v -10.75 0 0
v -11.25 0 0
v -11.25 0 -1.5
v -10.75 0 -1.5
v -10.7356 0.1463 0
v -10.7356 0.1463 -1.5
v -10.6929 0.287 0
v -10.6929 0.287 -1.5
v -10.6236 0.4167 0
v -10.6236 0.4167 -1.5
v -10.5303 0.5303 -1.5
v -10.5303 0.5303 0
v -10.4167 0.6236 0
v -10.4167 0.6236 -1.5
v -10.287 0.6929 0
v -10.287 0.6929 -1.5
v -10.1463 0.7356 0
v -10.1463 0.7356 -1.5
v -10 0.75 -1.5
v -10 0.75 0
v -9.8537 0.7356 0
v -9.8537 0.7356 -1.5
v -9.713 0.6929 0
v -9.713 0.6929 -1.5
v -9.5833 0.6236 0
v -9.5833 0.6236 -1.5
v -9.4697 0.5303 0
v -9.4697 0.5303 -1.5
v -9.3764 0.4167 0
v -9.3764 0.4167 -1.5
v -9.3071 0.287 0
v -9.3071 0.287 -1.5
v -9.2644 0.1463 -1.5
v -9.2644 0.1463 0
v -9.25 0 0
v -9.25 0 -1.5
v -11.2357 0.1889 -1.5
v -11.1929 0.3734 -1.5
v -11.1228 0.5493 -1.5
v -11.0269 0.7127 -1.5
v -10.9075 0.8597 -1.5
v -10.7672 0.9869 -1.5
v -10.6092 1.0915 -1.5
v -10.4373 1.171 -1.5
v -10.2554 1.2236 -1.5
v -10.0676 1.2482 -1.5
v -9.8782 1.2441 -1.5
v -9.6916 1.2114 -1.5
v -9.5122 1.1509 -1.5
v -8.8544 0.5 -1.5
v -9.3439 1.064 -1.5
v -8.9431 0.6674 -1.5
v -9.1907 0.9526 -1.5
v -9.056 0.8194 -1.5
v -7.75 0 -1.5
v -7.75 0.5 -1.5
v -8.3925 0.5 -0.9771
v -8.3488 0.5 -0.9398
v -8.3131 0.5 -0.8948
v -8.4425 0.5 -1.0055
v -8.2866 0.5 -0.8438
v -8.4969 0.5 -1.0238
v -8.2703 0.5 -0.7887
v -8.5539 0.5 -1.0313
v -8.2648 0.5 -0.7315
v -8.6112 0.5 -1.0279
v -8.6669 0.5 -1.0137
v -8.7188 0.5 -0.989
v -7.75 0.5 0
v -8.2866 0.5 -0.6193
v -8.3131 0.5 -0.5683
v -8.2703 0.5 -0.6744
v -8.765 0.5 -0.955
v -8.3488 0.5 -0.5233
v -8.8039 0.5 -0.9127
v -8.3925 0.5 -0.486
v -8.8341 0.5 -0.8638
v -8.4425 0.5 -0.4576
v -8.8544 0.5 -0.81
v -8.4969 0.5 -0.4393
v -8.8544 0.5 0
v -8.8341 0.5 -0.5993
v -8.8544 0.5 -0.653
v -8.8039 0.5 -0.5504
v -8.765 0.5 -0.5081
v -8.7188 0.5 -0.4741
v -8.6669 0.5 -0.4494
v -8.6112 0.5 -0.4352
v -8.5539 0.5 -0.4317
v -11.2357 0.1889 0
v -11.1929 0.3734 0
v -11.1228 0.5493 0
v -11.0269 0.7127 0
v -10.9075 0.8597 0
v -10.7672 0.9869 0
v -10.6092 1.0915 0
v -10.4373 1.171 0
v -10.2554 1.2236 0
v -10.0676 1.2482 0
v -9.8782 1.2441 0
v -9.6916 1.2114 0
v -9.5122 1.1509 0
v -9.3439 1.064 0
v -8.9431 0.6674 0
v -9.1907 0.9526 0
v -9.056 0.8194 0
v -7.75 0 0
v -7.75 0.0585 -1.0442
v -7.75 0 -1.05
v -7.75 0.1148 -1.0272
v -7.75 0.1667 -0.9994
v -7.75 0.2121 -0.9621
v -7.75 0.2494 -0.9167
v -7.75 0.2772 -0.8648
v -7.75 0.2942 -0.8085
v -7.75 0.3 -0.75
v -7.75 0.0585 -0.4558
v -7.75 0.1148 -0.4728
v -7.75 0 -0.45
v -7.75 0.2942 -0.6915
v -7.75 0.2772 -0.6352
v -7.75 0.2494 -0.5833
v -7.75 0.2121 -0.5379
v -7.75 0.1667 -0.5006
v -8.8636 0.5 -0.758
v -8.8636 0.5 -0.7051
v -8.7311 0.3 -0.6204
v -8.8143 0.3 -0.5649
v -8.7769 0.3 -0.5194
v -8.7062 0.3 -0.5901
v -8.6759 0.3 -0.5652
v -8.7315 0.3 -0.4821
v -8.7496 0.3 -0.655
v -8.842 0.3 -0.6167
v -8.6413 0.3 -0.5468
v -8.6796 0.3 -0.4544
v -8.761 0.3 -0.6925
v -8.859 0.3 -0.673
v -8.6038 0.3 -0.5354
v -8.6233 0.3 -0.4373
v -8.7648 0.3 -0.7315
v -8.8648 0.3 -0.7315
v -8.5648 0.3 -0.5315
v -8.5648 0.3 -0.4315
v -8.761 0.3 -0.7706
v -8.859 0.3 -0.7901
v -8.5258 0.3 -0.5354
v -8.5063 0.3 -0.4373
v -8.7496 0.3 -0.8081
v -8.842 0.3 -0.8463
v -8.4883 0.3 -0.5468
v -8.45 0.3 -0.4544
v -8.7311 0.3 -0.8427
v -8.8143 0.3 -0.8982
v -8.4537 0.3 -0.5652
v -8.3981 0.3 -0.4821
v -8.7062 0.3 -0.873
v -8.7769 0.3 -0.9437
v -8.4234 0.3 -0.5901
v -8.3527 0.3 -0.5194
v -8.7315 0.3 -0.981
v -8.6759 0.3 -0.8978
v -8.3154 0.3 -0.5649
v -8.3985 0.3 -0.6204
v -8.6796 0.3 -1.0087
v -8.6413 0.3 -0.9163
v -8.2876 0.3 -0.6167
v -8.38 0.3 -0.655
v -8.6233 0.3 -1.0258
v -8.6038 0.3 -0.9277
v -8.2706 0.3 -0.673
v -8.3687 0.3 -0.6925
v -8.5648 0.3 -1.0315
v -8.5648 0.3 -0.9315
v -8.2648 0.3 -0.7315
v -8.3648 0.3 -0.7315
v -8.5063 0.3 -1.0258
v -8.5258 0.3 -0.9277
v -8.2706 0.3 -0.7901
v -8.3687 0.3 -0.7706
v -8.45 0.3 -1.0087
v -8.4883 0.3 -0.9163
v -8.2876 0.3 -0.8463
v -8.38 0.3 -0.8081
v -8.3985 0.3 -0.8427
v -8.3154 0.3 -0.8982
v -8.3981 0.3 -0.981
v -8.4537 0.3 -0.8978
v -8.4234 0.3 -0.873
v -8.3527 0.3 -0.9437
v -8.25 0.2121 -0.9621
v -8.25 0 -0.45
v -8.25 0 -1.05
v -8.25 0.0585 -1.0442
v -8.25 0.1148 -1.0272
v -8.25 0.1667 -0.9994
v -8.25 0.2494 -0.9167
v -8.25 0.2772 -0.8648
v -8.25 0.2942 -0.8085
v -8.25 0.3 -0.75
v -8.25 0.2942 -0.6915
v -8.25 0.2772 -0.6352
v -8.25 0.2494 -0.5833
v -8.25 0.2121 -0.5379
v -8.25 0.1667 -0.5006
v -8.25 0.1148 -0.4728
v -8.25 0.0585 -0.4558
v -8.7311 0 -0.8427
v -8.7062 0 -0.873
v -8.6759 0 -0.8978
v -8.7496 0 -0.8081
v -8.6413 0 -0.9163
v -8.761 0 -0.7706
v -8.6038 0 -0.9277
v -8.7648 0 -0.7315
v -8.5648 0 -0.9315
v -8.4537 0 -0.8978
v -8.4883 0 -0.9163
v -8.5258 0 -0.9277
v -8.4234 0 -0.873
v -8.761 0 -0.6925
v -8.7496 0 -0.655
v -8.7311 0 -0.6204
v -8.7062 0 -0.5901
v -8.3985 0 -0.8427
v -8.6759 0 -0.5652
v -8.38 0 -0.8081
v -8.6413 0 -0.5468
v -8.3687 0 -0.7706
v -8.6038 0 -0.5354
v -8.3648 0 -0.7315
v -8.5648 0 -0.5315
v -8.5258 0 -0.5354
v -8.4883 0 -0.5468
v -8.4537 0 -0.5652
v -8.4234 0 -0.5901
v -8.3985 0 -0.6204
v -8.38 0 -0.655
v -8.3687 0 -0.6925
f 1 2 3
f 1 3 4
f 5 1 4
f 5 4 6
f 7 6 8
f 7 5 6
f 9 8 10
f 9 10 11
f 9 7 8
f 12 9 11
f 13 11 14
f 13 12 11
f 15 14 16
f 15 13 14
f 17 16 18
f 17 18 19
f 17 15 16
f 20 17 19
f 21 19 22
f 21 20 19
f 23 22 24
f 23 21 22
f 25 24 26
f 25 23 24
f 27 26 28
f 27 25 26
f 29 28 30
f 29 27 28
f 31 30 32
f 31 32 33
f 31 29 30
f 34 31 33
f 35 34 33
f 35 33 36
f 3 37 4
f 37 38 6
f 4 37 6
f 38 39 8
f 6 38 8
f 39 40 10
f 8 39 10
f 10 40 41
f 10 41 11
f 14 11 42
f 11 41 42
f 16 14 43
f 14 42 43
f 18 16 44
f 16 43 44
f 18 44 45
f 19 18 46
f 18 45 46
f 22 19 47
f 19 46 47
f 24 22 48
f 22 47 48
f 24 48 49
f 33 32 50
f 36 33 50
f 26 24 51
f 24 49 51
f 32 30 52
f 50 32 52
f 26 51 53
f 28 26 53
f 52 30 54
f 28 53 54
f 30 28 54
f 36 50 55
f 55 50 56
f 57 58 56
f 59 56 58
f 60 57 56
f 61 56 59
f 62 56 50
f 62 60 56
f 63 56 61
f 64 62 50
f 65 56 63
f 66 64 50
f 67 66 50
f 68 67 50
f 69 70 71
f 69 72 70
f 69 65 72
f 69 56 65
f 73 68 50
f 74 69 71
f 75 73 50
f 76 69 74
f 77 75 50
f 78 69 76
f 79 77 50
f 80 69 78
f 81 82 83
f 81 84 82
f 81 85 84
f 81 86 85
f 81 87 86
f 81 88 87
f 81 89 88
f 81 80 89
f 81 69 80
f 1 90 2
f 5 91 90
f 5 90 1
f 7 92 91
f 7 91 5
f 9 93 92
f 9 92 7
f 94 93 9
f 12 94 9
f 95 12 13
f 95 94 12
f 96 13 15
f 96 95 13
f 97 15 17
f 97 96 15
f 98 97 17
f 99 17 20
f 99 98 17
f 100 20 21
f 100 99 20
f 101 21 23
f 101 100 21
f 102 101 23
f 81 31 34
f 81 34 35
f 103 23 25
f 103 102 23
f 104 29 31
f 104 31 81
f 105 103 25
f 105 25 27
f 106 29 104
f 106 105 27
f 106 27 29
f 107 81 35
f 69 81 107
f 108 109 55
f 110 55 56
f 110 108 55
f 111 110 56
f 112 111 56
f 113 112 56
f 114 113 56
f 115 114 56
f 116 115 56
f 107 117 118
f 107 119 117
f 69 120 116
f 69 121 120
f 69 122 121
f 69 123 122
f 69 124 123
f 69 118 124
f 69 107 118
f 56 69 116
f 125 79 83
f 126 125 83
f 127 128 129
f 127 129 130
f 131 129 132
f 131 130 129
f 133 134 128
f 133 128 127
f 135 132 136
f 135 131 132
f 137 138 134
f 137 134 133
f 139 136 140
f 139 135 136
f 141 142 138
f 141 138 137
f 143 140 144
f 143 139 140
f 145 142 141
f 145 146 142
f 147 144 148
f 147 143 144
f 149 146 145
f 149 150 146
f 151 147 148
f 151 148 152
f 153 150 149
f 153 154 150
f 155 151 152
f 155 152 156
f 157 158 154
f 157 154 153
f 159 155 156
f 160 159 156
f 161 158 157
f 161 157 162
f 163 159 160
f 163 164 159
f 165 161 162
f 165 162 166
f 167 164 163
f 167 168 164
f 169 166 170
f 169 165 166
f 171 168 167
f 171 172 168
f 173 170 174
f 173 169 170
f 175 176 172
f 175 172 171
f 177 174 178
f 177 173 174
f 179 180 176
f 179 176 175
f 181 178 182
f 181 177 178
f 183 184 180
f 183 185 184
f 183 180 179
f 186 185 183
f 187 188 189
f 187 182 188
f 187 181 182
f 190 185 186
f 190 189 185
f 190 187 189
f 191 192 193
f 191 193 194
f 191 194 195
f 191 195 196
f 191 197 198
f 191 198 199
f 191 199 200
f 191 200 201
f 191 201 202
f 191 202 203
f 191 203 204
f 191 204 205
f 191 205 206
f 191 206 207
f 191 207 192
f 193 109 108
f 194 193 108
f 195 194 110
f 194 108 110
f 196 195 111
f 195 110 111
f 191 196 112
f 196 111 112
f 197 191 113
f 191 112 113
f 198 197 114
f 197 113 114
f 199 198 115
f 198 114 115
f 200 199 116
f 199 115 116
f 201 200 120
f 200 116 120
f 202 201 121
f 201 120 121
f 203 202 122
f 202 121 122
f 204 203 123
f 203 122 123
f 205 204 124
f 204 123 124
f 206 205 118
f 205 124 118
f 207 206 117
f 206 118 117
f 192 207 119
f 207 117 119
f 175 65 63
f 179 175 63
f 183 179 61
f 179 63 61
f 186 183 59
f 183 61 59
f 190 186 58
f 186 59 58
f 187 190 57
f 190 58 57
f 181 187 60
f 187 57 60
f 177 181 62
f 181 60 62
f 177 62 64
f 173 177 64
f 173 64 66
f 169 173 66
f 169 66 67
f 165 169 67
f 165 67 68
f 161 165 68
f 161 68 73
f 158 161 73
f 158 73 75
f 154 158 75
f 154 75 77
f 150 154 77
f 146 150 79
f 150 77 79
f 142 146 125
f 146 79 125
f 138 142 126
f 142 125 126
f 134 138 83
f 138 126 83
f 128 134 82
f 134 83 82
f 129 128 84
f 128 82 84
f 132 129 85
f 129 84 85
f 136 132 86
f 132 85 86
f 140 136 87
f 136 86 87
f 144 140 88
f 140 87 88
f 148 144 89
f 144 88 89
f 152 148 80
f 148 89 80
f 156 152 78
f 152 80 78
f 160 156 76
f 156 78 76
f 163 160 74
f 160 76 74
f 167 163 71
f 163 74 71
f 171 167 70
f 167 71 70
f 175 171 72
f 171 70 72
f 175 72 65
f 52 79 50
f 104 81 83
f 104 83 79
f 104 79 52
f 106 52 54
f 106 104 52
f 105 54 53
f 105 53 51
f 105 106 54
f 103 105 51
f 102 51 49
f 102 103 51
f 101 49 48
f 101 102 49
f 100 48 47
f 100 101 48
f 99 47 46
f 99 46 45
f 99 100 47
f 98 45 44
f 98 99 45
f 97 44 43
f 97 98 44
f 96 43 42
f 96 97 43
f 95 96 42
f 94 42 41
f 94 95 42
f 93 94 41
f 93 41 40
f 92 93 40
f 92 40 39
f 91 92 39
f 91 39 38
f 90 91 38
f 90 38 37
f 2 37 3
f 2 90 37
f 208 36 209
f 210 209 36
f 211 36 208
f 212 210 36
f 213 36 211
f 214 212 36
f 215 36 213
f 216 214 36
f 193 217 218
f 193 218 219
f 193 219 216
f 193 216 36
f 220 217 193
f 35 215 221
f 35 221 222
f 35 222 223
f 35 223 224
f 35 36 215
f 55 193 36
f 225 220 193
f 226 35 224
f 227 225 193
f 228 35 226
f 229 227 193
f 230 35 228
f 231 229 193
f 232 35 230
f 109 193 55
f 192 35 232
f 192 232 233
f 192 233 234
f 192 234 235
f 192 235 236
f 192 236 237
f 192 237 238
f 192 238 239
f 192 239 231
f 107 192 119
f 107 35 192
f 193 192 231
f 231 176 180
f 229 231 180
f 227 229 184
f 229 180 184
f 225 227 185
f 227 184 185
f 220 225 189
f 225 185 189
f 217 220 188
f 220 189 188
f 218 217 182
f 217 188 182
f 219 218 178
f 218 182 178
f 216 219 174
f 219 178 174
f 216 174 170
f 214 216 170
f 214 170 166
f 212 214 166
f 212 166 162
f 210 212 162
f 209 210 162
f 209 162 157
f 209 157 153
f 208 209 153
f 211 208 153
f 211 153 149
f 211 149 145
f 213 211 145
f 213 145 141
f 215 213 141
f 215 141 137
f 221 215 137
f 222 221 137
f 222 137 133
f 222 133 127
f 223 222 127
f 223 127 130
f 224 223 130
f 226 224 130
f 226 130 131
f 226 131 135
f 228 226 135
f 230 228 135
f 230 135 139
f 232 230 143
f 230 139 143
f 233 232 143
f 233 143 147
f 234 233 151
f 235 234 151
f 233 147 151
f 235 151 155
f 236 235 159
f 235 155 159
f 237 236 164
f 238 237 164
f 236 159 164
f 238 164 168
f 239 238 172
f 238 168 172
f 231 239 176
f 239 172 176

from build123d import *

# Parameters (mm, degrees)
EXTRUDE_1_DEPTH     = 1.5
SKETCH_3_R          = 0.2
CUT_EXTRUDE_1_DEPTH = 1.5
SKETCH_4_R          = 0.3
CUT_EXTRUDE_2_DEPTH = 0.5
SKETCH_5_R          = 0.3
CUT_EXTRUDE_3_DEPTH = 0.2


with BuildPart() as part:
    # 草图2 → 凸台-拉伸1 (new body)
    with BuildSketch(Plane.XY):
        with BuildLine():
            Line((-11.25, 0), (-10.75, 0))
            ThreePointArc((-10.75, 0), (-10, 0.75), (-9.25, 0))
            Line((-9.25, 0), (-7.75, 0))
            Line((-7.75, 0), (-7.75, 0.5))
            Line((-7.75, 0.5), (-8.854356076, 0.5))
            ThreePointArc((-8.854356076, 0.5), (-10.255387055, 1.223632891), (-11.25, 0))
        make_face()
    extrude(amount=-EXTRUDE_1_DEPTH)

    # 草图3 → 切除-拉伸1 (cut)
    with BuildSketch(Plane(origin=(0, 0.5, 0), x_dir=(1, 0, 0), z_dir=(0, 1, 0))):
        with Locations((-8.564809318, 0.731541815)):
            Circle(SKETCH_3_R)
    extrude(amount=-CUT_EXTRUDE_1_DEPTH, mode=Mode.SUBTRACT)

    # 草图4 → 切除-拉伸2 (cut)
    with BuildSketch(Plane(origin=(-7.75, 0, 0), x_dir=(0, 0, -1), z_dir=(1, 0, 0))):
        with Locations((0.75, 0)):
            Circle(SKETCH_4_R)
    extrude(amount=-CUT_EXTRUDE_2_DEPTH, mode=Mode.SUBTRACT)

    # 草图5 → 切除-拉伸3 (cut)
    with BuildSketch(Plane(origin=(0, 0.5, 0), x_dir=(1, 0, 0), z_dir=(0, 1, 0))):
        with Locations((-8.564809318, 0.731541815)):
            Circle(SKETCH_5_R)
    extrude(amount=-CUT_EXTRUDE_3_DEPTH, mode=Mode.SUBTRACT)


solid = part.part
